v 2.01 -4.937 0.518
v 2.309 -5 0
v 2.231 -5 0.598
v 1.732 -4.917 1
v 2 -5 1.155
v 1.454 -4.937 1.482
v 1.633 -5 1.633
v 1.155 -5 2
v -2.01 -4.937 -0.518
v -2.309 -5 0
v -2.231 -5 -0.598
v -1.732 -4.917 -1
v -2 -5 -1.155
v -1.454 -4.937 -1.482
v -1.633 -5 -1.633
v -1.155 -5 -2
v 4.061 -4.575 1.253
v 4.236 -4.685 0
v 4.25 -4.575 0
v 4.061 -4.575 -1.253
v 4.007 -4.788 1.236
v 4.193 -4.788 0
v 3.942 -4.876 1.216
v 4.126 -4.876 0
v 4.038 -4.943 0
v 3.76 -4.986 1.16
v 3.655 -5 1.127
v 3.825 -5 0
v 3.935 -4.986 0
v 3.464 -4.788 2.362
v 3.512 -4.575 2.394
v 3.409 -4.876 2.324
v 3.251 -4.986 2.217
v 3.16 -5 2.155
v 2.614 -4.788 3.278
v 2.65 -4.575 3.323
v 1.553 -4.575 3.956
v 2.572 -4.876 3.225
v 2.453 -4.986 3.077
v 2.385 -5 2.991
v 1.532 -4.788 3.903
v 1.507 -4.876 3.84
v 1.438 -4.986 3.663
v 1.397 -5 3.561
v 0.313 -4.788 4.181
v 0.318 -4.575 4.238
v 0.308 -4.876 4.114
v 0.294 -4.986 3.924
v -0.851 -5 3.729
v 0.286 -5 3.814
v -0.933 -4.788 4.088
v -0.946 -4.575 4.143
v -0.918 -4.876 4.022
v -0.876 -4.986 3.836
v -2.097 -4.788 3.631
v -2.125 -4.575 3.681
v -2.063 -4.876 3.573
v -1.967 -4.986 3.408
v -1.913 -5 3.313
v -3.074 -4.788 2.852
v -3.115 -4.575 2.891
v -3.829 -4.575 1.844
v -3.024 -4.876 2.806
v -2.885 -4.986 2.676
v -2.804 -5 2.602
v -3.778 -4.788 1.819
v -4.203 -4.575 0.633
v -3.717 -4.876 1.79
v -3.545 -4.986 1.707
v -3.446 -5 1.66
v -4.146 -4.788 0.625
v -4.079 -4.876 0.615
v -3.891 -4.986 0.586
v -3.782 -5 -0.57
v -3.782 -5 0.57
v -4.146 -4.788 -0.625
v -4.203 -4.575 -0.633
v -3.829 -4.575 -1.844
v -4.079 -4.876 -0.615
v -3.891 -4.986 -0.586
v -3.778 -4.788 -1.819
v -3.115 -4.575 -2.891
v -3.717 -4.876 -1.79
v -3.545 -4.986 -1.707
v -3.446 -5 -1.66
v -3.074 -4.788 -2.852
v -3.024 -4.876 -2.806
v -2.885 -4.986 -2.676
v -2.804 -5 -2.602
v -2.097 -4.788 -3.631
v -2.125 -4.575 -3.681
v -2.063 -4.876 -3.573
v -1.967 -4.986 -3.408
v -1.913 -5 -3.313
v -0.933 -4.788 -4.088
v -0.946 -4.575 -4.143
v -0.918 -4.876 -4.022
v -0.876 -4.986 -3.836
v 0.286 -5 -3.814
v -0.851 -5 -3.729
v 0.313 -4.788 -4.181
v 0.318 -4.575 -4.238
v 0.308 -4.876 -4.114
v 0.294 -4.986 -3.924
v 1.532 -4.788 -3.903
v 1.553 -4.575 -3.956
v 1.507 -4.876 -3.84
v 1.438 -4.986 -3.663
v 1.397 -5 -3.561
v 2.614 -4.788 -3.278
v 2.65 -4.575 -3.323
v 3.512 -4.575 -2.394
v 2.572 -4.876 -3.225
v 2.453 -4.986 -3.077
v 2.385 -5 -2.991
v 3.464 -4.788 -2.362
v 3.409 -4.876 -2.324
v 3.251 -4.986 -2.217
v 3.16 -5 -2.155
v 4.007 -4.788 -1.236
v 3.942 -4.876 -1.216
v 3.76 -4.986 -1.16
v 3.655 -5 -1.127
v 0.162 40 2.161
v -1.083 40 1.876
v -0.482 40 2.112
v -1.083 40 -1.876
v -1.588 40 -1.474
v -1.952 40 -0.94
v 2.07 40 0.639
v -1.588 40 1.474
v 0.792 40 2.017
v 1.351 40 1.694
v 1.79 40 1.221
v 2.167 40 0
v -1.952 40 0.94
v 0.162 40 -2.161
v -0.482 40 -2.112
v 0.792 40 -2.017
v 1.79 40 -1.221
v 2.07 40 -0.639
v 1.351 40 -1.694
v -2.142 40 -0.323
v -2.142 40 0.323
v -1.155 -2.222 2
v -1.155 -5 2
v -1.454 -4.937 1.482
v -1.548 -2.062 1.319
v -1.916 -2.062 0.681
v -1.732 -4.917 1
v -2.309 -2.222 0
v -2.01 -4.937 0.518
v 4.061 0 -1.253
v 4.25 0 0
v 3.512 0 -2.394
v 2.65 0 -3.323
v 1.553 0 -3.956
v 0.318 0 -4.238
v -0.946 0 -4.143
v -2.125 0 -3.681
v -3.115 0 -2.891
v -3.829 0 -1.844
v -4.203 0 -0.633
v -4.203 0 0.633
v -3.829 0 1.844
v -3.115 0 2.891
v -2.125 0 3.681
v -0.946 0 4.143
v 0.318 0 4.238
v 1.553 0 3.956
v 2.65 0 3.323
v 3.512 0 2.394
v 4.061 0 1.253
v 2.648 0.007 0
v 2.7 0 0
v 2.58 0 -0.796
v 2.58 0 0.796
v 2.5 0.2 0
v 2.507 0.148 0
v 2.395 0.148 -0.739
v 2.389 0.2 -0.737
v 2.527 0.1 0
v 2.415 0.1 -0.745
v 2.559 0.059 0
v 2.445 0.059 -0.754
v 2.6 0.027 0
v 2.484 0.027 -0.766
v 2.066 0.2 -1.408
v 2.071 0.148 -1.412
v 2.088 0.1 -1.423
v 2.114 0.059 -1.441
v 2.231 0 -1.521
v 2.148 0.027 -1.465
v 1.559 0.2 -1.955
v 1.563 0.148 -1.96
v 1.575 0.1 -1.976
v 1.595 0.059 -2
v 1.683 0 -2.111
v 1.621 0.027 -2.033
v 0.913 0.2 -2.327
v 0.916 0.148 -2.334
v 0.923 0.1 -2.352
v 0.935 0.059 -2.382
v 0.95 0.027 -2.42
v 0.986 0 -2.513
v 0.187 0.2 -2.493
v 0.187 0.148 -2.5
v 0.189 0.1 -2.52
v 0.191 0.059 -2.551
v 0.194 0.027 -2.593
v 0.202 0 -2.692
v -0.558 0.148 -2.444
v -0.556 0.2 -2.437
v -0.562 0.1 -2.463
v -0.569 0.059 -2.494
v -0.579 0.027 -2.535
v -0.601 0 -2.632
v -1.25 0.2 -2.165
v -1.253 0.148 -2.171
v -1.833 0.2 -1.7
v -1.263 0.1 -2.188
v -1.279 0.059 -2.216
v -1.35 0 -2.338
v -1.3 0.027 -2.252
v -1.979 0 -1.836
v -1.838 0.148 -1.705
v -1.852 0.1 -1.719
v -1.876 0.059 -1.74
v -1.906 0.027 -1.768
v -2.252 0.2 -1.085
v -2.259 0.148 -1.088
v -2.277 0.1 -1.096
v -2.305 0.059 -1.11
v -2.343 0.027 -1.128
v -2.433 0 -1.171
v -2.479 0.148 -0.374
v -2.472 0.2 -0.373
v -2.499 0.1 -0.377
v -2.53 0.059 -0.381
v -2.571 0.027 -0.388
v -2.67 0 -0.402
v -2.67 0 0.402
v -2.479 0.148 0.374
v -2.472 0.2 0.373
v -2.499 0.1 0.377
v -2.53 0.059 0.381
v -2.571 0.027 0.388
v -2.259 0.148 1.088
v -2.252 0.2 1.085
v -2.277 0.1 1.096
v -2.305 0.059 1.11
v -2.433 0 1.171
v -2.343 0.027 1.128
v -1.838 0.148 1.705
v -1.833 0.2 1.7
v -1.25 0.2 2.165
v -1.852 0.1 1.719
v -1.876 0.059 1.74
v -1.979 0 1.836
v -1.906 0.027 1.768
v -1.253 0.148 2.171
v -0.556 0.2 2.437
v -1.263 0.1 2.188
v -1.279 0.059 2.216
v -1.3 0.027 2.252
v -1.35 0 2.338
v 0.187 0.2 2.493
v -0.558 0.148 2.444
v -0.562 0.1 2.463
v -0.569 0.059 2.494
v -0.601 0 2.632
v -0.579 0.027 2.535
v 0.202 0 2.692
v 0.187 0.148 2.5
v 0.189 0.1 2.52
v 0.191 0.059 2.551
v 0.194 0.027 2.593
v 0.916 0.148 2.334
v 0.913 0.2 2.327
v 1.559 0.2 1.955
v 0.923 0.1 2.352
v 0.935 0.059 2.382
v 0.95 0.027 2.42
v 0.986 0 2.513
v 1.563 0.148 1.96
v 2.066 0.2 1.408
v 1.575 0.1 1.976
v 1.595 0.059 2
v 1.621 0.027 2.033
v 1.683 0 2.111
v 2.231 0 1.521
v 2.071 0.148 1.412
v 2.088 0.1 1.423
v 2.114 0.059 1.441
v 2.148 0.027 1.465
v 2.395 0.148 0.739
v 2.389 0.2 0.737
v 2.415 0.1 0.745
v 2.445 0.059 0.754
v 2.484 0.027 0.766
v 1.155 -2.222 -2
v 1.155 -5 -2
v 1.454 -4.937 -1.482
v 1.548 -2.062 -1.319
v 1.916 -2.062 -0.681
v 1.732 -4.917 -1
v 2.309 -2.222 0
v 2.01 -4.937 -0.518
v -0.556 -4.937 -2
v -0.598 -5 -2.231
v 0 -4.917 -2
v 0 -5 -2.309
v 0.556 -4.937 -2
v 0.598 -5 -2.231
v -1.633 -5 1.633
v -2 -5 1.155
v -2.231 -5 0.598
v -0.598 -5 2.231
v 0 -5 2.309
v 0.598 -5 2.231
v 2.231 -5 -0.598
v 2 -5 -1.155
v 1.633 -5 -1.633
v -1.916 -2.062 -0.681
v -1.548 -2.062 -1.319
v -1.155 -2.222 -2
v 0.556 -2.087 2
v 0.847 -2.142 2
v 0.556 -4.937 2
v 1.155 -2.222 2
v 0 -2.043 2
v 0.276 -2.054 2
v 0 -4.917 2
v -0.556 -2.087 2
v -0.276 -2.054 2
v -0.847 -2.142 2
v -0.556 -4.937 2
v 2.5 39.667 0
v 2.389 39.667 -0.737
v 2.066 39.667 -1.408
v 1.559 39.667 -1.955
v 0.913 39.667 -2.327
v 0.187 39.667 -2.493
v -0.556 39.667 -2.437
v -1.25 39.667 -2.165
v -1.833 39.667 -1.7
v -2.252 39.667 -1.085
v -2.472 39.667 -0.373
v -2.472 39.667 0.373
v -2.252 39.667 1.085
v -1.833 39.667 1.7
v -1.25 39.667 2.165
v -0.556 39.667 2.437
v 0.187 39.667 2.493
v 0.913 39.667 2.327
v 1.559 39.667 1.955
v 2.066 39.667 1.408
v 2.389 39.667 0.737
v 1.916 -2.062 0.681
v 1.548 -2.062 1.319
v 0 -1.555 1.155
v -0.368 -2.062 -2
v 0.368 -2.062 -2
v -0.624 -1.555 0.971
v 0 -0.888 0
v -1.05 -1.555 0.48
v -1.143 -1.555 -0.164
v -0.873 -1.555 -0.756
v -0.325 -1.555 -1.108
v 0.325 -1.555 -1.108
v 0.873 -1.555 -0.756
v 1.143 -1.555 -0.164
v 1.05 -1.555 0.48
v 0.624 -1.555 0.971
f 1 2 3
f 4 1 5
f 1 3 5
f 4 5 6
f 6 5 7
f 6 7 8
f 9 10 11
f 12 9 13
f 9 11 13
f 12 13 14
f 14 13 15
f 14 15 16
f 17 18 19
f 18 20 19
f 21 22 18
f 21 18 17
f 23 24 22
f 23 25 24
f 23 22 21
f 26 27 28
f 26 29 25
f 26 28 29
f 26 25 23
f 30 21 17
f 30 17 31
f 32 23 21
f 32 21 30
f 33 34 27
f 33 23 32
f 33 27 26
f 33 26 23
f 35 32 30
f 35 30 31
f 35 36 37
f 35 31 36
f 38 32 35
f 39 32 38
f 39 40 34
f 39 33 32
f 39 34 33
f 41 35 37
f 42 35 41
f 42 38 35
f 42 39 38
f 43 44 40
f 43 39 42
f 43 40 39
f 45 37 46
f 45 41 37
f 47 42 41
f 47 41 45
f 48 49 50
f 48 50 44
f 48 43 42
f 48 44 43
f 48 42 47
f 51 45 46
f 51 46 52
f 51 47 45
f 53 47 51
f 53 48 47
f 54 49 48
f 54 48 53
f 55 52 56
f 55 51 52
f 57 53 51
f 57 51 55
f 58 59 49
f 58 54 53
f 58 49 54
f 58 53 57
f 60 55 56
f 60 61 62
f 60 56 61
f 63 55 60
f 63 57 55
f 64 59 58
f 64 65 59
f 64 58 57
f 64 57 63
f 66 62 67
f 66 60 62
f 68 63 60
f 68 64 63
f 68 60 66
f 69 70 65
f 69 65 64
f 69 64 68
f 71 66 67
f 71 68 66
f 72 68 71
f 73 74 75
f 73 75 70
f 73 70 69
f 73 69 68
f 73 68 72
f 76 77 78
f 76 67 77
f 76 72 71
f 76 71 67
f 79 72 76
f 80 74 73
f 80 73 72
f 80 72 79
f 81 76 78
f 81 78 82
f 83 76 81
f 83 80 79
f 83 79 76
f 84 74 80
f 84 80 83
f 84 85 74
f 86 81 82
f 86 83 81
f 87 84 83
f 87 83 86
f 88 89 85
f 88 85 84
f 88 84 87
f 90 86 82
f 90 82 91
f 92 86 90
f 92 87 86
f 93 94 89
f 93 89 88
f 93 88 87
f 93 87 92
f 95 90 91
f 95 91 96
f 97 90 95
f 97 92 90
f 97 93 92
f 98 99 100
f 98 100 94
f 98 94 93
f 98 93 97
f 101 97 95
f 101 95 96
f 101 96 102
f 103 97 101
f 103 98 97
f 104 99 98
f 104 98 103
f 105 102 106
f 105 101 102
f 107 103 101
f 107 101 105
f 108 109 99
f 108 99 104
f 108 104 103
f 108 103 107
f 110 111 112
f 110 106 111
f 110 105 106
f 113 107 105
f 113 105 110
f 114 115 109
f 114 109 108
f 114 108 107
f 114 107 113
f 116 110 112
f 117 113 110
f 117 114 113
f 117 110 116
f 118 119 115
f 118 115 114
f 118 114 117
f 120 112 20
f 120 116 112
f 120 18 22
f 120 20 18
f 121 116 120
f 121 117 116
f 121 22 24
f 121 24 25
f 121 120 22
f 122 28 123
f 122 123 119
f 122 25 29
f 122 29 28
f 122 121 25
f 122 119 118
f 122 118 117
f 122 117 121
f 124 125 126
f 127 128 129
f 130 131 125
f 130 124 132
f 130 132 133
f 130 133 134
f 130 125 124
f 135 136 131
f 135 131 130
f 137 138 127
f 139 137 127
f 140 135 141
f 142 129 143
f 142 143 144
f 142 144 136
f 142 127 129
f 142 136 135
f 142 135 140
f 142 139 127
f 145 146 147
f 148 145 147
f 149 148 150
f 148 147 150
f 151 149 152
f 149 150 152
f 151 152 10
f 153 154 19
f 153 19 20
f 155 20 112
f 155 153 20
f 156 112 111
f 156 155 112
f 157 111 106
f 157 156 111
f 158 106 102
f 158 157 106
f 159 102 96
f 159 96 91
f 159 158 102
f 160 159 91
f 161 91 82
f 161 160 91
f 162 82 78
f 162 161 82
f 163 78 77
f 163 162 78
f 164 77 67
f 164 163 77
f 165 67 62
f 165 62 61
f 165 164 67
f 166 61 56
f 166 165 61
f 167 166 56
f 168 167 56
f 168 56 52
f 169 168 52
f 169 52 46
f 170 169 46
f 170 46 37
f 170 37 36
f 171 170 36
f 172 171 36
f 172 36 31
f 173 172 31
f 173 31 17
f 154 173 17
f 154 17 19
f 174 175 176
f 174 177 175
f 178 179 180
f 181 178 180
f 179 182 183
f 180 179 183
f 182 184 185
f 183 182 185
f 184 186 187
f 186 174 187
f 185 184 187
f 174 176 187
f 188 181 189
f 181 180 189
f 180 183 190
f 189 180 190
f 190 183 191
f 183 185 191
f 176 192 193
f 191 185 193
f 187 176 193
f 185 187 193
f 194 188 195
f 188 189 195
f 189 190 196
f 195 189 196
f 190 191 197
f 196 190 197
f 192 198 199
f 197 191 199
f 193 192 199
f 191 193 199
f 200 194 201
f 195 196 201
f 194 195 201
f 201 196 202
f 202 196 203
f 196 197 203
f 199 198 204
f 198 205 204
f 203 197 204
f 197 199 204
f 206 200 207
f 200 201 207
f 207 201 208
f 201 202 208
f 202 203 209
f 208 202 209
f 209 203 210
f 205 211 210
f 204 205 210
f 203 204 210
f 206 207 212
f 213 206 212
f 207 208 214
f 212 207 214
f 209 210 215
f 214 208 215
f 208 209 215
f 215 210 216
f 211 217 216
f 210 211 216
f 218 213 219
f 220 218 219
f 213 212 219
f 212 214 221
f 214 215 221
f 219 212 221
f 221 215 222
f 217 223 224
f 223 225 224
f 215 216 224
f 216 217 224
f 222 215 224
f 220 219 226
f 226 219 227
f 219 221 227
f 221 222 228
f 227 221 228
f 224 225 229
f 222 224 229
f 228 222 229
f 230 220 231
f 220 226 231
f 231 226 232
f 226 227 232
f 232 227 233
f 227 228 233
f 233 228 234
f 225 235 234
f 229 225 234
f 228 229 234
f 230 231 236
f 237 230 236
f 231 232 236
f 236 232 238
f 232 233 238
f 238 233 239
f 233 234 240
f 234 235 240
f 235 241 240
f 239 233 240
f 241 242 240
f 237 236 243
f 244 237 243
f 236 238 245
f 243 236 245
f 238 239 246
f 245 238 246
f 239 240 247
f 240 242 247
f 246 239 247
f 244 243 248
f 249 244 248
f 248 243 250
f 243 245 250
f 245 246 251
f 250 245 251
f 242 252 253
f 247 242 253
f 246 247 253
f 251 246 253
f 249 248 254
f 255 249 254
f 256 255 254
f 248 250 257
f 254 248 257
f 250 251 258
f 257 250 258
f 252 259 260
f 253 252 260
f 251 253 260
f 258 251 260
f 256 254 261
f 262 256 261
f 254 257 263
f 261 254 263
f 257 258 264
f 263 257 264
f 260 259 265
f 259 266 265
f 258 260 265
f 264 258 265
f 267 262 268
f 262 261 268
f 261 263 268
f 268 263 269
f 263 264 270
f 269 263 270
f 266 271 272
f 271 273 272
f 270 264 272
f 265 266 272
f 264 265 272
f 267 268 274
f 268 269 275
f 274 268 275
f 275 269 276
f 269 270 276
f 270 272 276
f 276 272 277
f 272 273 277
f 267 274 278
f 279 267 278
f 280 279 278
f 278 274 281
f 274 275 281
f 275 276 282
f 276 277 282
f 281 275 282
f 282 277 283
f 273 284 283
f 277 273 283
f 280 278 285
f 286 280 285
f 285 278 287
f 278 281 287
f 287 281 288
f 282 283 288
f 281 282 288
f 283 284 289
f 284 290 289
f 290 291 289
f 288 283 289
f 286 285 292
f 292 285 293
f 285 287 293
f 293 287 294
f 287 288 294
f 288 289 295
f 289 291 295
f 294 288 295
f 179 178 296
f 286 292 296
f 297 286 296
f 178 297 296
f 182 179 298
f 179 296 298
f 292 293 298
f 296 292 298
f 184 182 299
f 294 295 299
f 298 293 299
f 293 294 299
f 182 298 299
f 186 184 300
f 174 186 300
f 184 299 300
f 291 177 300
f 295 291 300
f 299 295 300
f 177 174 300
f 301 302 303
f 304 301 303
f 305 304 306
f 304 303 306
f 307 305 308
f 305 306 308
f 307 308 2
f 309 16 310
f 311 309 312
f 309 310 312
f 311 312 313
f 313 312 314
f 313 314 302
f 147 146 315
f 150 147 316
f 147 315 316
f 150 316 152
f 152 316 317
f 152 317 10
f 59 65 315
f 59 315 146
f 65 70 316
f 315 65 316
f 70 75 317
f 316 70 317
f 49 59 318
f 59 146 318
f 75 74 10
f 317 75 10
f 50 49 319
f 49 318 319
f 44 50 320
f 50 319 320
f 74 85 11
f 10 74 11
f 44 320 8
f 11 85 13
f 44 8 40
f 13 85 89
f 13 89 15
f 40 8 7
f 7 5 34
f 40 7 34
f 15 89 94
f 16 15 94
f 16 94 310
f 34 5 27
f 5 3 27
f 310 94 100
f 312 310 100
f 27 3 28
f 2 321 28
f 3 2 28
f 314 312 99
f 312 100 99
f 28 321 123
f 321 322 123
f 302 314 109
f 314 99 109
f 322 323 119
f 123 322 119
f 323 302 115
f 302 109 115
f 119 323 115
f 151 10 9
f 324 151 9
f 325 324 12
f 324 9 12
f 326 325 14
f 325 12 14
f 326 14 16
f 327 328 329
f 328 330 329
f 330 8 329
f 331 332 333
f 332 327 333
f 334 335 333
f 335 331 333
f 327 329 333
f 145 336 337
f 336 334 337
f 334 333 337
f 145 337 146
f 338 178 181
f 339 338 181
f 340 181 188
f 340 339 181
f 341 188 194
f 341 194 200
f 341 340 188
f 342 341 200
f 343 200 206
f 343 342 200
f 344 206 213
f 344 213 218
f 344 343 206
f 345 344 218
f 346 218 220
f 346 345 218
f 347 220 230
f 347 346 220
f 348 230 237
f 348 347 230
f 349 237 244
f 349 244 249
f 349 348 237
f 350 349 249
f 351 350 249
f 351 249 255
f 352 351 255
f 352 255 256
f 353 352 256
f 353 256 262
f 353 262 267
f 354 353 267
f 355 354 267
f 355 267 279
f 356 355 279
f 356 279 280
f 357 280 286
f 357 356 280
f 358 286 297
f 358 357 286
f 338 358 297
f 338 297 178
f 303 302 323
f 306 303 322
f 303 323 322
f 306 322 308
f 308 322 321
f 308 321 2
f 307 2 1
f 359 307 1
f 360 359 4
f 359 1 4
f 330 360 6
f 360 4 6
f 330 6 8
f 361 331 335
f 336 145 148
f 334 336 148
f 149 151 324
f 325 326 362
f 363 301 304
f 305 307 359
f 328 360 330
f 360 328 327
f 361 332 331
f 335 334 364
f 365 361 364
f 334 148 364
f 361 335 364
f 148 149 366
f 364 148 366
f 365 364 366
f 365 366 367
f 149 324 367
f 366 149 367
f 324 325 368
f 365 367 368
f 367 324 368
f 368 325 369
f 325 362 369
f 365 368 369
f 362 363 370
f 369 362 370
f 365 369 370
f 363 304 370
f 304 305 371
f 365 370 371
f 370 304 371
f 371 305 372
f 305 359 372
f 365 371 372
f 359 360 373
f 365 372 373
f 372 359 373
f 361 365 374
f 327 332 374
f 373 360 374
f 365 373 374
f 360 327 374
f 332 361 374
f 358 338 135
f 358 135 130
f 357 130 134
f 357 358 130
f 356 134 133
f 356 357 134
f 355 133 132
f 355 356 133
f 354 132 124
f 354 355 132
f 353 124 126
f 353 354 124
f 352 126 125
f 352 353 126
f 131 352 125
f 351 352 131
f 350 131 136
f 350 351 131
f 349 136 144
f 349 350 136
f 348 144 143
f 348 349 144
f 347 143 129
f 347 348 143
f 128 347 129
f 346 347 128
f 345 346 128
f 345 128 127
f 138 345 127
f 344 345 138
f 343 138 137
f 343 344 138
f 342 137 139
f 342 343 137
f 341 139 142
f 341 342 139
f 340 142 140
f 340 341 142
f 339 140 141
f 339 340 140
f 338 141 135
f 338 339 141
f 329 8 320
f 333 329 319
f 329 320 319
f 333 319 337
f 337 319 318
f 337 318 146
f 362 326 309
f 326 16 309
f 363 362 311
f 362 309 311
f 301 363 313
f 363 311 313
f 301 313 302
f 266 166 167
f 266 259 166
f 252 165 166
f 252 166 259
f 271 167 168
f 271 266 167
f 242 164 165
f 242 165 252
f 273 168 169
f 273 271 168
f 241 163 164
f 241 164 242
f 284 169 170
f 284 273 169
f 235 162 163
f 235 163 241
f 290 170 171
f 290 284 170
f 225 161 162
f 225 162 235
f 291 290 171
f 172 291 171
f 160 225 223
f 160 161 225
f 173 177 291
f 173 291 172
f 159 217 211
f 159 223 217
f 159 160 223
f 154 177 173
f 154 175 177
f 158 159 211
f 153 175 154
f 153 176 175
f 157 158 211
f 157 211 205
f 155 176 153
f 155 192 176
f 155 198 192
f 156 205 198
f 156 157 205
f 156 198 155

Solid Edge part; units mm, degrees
sketch "Sketch1" plane through (0, 0, 0) normal (0, 0, 1) x (1, 0, 0)
  line L0 (2.5, 0) -> (2.5, 40)
  line L1 (0, 40) -> (2.5, 40)
  line L2 (0, 0) -> (0, 40)
  line L3 (0, 0) -> (0, -5)
  line L4 (0, -5) -> (4.25, -5)
  line L5 (4.25, -5) -> (4.25, 0)
  line L6 (4.25, 0) -> (2.5, 0)
revolve "RevolvedProtrusion1" add sketch "Sketch1" angle 360 about axis through (0, 0, 0) along (0, 1, 0)
sketch "Sketch2" plane through (0, 0, 0) normal (1, 0, 0) x (0, 1, 0)
  line L0 (-5, 2.7915) -> (-2.5, 2.7915)
  line L1 (-0.8883, 0) -> (-2.5, 2.7915)
  line L2 (-5, 0) -> (-0.8883, 0)
  line L3 (-5, 0) -> (-5, 2.7915)
revolve "RevolvedCutout1" cut sketch "Sketch2" angle 360 about axis through (0, -4.5, 0) along (0, 1, 0)
sketch "Sketch3" plane through (0, -5, 0) normal (0, -1, 0) x (0, 0, 1)
  circle A0 centre (0, 0) radius 2.7915
  line L0 (-2, -1.1547) -> (0, -2.3094)
  line L1 (0, -2.3094) -> (2, -1.1547)
  line L2 (2, -1.1547) -> (2, 1.1547)
  line L3 (2, 1.1547) -> (0, 2.3094)
  line L4 (0, 2.3094) -> (-2, 1.1547)
  line L5 (-2, 1.1547) -> (-2, -1.1547)
  dimension "D1" = 4
extrude "Protrusion1" add sketch "Sketch3" against normal up to next
sketch "Sketch4" plane through (0, 0, 0) normal (0, 0, 1) x (1, 0, 0)
  line L0 (-2.3094, -5) -> (0, -5)
  line L1 (0, -5) -> (0, -4.3812)
  line L2 (0, -4.3812) -> (-2.3094, -5)
revolve "RevolvedCutout2" cut sketch "Sketch4" angle 360 about axis through (0, -4.5, 0) along (0, 1, 0)
fillet "Round1" radius 0.2 1 edges at (0, 0, -2.5)
fillet "Round2" radius 0.425 1 edges at (0, -5, -4.25)
chamfer "倒斜角_2" distance 0.3333 angle 45 1 edges at (0, 40, -2.5)
cosmetic_thread "螺纹_3" size "M5" thread depth 32
properties part number "N2611-031G" material "铝 1060"
